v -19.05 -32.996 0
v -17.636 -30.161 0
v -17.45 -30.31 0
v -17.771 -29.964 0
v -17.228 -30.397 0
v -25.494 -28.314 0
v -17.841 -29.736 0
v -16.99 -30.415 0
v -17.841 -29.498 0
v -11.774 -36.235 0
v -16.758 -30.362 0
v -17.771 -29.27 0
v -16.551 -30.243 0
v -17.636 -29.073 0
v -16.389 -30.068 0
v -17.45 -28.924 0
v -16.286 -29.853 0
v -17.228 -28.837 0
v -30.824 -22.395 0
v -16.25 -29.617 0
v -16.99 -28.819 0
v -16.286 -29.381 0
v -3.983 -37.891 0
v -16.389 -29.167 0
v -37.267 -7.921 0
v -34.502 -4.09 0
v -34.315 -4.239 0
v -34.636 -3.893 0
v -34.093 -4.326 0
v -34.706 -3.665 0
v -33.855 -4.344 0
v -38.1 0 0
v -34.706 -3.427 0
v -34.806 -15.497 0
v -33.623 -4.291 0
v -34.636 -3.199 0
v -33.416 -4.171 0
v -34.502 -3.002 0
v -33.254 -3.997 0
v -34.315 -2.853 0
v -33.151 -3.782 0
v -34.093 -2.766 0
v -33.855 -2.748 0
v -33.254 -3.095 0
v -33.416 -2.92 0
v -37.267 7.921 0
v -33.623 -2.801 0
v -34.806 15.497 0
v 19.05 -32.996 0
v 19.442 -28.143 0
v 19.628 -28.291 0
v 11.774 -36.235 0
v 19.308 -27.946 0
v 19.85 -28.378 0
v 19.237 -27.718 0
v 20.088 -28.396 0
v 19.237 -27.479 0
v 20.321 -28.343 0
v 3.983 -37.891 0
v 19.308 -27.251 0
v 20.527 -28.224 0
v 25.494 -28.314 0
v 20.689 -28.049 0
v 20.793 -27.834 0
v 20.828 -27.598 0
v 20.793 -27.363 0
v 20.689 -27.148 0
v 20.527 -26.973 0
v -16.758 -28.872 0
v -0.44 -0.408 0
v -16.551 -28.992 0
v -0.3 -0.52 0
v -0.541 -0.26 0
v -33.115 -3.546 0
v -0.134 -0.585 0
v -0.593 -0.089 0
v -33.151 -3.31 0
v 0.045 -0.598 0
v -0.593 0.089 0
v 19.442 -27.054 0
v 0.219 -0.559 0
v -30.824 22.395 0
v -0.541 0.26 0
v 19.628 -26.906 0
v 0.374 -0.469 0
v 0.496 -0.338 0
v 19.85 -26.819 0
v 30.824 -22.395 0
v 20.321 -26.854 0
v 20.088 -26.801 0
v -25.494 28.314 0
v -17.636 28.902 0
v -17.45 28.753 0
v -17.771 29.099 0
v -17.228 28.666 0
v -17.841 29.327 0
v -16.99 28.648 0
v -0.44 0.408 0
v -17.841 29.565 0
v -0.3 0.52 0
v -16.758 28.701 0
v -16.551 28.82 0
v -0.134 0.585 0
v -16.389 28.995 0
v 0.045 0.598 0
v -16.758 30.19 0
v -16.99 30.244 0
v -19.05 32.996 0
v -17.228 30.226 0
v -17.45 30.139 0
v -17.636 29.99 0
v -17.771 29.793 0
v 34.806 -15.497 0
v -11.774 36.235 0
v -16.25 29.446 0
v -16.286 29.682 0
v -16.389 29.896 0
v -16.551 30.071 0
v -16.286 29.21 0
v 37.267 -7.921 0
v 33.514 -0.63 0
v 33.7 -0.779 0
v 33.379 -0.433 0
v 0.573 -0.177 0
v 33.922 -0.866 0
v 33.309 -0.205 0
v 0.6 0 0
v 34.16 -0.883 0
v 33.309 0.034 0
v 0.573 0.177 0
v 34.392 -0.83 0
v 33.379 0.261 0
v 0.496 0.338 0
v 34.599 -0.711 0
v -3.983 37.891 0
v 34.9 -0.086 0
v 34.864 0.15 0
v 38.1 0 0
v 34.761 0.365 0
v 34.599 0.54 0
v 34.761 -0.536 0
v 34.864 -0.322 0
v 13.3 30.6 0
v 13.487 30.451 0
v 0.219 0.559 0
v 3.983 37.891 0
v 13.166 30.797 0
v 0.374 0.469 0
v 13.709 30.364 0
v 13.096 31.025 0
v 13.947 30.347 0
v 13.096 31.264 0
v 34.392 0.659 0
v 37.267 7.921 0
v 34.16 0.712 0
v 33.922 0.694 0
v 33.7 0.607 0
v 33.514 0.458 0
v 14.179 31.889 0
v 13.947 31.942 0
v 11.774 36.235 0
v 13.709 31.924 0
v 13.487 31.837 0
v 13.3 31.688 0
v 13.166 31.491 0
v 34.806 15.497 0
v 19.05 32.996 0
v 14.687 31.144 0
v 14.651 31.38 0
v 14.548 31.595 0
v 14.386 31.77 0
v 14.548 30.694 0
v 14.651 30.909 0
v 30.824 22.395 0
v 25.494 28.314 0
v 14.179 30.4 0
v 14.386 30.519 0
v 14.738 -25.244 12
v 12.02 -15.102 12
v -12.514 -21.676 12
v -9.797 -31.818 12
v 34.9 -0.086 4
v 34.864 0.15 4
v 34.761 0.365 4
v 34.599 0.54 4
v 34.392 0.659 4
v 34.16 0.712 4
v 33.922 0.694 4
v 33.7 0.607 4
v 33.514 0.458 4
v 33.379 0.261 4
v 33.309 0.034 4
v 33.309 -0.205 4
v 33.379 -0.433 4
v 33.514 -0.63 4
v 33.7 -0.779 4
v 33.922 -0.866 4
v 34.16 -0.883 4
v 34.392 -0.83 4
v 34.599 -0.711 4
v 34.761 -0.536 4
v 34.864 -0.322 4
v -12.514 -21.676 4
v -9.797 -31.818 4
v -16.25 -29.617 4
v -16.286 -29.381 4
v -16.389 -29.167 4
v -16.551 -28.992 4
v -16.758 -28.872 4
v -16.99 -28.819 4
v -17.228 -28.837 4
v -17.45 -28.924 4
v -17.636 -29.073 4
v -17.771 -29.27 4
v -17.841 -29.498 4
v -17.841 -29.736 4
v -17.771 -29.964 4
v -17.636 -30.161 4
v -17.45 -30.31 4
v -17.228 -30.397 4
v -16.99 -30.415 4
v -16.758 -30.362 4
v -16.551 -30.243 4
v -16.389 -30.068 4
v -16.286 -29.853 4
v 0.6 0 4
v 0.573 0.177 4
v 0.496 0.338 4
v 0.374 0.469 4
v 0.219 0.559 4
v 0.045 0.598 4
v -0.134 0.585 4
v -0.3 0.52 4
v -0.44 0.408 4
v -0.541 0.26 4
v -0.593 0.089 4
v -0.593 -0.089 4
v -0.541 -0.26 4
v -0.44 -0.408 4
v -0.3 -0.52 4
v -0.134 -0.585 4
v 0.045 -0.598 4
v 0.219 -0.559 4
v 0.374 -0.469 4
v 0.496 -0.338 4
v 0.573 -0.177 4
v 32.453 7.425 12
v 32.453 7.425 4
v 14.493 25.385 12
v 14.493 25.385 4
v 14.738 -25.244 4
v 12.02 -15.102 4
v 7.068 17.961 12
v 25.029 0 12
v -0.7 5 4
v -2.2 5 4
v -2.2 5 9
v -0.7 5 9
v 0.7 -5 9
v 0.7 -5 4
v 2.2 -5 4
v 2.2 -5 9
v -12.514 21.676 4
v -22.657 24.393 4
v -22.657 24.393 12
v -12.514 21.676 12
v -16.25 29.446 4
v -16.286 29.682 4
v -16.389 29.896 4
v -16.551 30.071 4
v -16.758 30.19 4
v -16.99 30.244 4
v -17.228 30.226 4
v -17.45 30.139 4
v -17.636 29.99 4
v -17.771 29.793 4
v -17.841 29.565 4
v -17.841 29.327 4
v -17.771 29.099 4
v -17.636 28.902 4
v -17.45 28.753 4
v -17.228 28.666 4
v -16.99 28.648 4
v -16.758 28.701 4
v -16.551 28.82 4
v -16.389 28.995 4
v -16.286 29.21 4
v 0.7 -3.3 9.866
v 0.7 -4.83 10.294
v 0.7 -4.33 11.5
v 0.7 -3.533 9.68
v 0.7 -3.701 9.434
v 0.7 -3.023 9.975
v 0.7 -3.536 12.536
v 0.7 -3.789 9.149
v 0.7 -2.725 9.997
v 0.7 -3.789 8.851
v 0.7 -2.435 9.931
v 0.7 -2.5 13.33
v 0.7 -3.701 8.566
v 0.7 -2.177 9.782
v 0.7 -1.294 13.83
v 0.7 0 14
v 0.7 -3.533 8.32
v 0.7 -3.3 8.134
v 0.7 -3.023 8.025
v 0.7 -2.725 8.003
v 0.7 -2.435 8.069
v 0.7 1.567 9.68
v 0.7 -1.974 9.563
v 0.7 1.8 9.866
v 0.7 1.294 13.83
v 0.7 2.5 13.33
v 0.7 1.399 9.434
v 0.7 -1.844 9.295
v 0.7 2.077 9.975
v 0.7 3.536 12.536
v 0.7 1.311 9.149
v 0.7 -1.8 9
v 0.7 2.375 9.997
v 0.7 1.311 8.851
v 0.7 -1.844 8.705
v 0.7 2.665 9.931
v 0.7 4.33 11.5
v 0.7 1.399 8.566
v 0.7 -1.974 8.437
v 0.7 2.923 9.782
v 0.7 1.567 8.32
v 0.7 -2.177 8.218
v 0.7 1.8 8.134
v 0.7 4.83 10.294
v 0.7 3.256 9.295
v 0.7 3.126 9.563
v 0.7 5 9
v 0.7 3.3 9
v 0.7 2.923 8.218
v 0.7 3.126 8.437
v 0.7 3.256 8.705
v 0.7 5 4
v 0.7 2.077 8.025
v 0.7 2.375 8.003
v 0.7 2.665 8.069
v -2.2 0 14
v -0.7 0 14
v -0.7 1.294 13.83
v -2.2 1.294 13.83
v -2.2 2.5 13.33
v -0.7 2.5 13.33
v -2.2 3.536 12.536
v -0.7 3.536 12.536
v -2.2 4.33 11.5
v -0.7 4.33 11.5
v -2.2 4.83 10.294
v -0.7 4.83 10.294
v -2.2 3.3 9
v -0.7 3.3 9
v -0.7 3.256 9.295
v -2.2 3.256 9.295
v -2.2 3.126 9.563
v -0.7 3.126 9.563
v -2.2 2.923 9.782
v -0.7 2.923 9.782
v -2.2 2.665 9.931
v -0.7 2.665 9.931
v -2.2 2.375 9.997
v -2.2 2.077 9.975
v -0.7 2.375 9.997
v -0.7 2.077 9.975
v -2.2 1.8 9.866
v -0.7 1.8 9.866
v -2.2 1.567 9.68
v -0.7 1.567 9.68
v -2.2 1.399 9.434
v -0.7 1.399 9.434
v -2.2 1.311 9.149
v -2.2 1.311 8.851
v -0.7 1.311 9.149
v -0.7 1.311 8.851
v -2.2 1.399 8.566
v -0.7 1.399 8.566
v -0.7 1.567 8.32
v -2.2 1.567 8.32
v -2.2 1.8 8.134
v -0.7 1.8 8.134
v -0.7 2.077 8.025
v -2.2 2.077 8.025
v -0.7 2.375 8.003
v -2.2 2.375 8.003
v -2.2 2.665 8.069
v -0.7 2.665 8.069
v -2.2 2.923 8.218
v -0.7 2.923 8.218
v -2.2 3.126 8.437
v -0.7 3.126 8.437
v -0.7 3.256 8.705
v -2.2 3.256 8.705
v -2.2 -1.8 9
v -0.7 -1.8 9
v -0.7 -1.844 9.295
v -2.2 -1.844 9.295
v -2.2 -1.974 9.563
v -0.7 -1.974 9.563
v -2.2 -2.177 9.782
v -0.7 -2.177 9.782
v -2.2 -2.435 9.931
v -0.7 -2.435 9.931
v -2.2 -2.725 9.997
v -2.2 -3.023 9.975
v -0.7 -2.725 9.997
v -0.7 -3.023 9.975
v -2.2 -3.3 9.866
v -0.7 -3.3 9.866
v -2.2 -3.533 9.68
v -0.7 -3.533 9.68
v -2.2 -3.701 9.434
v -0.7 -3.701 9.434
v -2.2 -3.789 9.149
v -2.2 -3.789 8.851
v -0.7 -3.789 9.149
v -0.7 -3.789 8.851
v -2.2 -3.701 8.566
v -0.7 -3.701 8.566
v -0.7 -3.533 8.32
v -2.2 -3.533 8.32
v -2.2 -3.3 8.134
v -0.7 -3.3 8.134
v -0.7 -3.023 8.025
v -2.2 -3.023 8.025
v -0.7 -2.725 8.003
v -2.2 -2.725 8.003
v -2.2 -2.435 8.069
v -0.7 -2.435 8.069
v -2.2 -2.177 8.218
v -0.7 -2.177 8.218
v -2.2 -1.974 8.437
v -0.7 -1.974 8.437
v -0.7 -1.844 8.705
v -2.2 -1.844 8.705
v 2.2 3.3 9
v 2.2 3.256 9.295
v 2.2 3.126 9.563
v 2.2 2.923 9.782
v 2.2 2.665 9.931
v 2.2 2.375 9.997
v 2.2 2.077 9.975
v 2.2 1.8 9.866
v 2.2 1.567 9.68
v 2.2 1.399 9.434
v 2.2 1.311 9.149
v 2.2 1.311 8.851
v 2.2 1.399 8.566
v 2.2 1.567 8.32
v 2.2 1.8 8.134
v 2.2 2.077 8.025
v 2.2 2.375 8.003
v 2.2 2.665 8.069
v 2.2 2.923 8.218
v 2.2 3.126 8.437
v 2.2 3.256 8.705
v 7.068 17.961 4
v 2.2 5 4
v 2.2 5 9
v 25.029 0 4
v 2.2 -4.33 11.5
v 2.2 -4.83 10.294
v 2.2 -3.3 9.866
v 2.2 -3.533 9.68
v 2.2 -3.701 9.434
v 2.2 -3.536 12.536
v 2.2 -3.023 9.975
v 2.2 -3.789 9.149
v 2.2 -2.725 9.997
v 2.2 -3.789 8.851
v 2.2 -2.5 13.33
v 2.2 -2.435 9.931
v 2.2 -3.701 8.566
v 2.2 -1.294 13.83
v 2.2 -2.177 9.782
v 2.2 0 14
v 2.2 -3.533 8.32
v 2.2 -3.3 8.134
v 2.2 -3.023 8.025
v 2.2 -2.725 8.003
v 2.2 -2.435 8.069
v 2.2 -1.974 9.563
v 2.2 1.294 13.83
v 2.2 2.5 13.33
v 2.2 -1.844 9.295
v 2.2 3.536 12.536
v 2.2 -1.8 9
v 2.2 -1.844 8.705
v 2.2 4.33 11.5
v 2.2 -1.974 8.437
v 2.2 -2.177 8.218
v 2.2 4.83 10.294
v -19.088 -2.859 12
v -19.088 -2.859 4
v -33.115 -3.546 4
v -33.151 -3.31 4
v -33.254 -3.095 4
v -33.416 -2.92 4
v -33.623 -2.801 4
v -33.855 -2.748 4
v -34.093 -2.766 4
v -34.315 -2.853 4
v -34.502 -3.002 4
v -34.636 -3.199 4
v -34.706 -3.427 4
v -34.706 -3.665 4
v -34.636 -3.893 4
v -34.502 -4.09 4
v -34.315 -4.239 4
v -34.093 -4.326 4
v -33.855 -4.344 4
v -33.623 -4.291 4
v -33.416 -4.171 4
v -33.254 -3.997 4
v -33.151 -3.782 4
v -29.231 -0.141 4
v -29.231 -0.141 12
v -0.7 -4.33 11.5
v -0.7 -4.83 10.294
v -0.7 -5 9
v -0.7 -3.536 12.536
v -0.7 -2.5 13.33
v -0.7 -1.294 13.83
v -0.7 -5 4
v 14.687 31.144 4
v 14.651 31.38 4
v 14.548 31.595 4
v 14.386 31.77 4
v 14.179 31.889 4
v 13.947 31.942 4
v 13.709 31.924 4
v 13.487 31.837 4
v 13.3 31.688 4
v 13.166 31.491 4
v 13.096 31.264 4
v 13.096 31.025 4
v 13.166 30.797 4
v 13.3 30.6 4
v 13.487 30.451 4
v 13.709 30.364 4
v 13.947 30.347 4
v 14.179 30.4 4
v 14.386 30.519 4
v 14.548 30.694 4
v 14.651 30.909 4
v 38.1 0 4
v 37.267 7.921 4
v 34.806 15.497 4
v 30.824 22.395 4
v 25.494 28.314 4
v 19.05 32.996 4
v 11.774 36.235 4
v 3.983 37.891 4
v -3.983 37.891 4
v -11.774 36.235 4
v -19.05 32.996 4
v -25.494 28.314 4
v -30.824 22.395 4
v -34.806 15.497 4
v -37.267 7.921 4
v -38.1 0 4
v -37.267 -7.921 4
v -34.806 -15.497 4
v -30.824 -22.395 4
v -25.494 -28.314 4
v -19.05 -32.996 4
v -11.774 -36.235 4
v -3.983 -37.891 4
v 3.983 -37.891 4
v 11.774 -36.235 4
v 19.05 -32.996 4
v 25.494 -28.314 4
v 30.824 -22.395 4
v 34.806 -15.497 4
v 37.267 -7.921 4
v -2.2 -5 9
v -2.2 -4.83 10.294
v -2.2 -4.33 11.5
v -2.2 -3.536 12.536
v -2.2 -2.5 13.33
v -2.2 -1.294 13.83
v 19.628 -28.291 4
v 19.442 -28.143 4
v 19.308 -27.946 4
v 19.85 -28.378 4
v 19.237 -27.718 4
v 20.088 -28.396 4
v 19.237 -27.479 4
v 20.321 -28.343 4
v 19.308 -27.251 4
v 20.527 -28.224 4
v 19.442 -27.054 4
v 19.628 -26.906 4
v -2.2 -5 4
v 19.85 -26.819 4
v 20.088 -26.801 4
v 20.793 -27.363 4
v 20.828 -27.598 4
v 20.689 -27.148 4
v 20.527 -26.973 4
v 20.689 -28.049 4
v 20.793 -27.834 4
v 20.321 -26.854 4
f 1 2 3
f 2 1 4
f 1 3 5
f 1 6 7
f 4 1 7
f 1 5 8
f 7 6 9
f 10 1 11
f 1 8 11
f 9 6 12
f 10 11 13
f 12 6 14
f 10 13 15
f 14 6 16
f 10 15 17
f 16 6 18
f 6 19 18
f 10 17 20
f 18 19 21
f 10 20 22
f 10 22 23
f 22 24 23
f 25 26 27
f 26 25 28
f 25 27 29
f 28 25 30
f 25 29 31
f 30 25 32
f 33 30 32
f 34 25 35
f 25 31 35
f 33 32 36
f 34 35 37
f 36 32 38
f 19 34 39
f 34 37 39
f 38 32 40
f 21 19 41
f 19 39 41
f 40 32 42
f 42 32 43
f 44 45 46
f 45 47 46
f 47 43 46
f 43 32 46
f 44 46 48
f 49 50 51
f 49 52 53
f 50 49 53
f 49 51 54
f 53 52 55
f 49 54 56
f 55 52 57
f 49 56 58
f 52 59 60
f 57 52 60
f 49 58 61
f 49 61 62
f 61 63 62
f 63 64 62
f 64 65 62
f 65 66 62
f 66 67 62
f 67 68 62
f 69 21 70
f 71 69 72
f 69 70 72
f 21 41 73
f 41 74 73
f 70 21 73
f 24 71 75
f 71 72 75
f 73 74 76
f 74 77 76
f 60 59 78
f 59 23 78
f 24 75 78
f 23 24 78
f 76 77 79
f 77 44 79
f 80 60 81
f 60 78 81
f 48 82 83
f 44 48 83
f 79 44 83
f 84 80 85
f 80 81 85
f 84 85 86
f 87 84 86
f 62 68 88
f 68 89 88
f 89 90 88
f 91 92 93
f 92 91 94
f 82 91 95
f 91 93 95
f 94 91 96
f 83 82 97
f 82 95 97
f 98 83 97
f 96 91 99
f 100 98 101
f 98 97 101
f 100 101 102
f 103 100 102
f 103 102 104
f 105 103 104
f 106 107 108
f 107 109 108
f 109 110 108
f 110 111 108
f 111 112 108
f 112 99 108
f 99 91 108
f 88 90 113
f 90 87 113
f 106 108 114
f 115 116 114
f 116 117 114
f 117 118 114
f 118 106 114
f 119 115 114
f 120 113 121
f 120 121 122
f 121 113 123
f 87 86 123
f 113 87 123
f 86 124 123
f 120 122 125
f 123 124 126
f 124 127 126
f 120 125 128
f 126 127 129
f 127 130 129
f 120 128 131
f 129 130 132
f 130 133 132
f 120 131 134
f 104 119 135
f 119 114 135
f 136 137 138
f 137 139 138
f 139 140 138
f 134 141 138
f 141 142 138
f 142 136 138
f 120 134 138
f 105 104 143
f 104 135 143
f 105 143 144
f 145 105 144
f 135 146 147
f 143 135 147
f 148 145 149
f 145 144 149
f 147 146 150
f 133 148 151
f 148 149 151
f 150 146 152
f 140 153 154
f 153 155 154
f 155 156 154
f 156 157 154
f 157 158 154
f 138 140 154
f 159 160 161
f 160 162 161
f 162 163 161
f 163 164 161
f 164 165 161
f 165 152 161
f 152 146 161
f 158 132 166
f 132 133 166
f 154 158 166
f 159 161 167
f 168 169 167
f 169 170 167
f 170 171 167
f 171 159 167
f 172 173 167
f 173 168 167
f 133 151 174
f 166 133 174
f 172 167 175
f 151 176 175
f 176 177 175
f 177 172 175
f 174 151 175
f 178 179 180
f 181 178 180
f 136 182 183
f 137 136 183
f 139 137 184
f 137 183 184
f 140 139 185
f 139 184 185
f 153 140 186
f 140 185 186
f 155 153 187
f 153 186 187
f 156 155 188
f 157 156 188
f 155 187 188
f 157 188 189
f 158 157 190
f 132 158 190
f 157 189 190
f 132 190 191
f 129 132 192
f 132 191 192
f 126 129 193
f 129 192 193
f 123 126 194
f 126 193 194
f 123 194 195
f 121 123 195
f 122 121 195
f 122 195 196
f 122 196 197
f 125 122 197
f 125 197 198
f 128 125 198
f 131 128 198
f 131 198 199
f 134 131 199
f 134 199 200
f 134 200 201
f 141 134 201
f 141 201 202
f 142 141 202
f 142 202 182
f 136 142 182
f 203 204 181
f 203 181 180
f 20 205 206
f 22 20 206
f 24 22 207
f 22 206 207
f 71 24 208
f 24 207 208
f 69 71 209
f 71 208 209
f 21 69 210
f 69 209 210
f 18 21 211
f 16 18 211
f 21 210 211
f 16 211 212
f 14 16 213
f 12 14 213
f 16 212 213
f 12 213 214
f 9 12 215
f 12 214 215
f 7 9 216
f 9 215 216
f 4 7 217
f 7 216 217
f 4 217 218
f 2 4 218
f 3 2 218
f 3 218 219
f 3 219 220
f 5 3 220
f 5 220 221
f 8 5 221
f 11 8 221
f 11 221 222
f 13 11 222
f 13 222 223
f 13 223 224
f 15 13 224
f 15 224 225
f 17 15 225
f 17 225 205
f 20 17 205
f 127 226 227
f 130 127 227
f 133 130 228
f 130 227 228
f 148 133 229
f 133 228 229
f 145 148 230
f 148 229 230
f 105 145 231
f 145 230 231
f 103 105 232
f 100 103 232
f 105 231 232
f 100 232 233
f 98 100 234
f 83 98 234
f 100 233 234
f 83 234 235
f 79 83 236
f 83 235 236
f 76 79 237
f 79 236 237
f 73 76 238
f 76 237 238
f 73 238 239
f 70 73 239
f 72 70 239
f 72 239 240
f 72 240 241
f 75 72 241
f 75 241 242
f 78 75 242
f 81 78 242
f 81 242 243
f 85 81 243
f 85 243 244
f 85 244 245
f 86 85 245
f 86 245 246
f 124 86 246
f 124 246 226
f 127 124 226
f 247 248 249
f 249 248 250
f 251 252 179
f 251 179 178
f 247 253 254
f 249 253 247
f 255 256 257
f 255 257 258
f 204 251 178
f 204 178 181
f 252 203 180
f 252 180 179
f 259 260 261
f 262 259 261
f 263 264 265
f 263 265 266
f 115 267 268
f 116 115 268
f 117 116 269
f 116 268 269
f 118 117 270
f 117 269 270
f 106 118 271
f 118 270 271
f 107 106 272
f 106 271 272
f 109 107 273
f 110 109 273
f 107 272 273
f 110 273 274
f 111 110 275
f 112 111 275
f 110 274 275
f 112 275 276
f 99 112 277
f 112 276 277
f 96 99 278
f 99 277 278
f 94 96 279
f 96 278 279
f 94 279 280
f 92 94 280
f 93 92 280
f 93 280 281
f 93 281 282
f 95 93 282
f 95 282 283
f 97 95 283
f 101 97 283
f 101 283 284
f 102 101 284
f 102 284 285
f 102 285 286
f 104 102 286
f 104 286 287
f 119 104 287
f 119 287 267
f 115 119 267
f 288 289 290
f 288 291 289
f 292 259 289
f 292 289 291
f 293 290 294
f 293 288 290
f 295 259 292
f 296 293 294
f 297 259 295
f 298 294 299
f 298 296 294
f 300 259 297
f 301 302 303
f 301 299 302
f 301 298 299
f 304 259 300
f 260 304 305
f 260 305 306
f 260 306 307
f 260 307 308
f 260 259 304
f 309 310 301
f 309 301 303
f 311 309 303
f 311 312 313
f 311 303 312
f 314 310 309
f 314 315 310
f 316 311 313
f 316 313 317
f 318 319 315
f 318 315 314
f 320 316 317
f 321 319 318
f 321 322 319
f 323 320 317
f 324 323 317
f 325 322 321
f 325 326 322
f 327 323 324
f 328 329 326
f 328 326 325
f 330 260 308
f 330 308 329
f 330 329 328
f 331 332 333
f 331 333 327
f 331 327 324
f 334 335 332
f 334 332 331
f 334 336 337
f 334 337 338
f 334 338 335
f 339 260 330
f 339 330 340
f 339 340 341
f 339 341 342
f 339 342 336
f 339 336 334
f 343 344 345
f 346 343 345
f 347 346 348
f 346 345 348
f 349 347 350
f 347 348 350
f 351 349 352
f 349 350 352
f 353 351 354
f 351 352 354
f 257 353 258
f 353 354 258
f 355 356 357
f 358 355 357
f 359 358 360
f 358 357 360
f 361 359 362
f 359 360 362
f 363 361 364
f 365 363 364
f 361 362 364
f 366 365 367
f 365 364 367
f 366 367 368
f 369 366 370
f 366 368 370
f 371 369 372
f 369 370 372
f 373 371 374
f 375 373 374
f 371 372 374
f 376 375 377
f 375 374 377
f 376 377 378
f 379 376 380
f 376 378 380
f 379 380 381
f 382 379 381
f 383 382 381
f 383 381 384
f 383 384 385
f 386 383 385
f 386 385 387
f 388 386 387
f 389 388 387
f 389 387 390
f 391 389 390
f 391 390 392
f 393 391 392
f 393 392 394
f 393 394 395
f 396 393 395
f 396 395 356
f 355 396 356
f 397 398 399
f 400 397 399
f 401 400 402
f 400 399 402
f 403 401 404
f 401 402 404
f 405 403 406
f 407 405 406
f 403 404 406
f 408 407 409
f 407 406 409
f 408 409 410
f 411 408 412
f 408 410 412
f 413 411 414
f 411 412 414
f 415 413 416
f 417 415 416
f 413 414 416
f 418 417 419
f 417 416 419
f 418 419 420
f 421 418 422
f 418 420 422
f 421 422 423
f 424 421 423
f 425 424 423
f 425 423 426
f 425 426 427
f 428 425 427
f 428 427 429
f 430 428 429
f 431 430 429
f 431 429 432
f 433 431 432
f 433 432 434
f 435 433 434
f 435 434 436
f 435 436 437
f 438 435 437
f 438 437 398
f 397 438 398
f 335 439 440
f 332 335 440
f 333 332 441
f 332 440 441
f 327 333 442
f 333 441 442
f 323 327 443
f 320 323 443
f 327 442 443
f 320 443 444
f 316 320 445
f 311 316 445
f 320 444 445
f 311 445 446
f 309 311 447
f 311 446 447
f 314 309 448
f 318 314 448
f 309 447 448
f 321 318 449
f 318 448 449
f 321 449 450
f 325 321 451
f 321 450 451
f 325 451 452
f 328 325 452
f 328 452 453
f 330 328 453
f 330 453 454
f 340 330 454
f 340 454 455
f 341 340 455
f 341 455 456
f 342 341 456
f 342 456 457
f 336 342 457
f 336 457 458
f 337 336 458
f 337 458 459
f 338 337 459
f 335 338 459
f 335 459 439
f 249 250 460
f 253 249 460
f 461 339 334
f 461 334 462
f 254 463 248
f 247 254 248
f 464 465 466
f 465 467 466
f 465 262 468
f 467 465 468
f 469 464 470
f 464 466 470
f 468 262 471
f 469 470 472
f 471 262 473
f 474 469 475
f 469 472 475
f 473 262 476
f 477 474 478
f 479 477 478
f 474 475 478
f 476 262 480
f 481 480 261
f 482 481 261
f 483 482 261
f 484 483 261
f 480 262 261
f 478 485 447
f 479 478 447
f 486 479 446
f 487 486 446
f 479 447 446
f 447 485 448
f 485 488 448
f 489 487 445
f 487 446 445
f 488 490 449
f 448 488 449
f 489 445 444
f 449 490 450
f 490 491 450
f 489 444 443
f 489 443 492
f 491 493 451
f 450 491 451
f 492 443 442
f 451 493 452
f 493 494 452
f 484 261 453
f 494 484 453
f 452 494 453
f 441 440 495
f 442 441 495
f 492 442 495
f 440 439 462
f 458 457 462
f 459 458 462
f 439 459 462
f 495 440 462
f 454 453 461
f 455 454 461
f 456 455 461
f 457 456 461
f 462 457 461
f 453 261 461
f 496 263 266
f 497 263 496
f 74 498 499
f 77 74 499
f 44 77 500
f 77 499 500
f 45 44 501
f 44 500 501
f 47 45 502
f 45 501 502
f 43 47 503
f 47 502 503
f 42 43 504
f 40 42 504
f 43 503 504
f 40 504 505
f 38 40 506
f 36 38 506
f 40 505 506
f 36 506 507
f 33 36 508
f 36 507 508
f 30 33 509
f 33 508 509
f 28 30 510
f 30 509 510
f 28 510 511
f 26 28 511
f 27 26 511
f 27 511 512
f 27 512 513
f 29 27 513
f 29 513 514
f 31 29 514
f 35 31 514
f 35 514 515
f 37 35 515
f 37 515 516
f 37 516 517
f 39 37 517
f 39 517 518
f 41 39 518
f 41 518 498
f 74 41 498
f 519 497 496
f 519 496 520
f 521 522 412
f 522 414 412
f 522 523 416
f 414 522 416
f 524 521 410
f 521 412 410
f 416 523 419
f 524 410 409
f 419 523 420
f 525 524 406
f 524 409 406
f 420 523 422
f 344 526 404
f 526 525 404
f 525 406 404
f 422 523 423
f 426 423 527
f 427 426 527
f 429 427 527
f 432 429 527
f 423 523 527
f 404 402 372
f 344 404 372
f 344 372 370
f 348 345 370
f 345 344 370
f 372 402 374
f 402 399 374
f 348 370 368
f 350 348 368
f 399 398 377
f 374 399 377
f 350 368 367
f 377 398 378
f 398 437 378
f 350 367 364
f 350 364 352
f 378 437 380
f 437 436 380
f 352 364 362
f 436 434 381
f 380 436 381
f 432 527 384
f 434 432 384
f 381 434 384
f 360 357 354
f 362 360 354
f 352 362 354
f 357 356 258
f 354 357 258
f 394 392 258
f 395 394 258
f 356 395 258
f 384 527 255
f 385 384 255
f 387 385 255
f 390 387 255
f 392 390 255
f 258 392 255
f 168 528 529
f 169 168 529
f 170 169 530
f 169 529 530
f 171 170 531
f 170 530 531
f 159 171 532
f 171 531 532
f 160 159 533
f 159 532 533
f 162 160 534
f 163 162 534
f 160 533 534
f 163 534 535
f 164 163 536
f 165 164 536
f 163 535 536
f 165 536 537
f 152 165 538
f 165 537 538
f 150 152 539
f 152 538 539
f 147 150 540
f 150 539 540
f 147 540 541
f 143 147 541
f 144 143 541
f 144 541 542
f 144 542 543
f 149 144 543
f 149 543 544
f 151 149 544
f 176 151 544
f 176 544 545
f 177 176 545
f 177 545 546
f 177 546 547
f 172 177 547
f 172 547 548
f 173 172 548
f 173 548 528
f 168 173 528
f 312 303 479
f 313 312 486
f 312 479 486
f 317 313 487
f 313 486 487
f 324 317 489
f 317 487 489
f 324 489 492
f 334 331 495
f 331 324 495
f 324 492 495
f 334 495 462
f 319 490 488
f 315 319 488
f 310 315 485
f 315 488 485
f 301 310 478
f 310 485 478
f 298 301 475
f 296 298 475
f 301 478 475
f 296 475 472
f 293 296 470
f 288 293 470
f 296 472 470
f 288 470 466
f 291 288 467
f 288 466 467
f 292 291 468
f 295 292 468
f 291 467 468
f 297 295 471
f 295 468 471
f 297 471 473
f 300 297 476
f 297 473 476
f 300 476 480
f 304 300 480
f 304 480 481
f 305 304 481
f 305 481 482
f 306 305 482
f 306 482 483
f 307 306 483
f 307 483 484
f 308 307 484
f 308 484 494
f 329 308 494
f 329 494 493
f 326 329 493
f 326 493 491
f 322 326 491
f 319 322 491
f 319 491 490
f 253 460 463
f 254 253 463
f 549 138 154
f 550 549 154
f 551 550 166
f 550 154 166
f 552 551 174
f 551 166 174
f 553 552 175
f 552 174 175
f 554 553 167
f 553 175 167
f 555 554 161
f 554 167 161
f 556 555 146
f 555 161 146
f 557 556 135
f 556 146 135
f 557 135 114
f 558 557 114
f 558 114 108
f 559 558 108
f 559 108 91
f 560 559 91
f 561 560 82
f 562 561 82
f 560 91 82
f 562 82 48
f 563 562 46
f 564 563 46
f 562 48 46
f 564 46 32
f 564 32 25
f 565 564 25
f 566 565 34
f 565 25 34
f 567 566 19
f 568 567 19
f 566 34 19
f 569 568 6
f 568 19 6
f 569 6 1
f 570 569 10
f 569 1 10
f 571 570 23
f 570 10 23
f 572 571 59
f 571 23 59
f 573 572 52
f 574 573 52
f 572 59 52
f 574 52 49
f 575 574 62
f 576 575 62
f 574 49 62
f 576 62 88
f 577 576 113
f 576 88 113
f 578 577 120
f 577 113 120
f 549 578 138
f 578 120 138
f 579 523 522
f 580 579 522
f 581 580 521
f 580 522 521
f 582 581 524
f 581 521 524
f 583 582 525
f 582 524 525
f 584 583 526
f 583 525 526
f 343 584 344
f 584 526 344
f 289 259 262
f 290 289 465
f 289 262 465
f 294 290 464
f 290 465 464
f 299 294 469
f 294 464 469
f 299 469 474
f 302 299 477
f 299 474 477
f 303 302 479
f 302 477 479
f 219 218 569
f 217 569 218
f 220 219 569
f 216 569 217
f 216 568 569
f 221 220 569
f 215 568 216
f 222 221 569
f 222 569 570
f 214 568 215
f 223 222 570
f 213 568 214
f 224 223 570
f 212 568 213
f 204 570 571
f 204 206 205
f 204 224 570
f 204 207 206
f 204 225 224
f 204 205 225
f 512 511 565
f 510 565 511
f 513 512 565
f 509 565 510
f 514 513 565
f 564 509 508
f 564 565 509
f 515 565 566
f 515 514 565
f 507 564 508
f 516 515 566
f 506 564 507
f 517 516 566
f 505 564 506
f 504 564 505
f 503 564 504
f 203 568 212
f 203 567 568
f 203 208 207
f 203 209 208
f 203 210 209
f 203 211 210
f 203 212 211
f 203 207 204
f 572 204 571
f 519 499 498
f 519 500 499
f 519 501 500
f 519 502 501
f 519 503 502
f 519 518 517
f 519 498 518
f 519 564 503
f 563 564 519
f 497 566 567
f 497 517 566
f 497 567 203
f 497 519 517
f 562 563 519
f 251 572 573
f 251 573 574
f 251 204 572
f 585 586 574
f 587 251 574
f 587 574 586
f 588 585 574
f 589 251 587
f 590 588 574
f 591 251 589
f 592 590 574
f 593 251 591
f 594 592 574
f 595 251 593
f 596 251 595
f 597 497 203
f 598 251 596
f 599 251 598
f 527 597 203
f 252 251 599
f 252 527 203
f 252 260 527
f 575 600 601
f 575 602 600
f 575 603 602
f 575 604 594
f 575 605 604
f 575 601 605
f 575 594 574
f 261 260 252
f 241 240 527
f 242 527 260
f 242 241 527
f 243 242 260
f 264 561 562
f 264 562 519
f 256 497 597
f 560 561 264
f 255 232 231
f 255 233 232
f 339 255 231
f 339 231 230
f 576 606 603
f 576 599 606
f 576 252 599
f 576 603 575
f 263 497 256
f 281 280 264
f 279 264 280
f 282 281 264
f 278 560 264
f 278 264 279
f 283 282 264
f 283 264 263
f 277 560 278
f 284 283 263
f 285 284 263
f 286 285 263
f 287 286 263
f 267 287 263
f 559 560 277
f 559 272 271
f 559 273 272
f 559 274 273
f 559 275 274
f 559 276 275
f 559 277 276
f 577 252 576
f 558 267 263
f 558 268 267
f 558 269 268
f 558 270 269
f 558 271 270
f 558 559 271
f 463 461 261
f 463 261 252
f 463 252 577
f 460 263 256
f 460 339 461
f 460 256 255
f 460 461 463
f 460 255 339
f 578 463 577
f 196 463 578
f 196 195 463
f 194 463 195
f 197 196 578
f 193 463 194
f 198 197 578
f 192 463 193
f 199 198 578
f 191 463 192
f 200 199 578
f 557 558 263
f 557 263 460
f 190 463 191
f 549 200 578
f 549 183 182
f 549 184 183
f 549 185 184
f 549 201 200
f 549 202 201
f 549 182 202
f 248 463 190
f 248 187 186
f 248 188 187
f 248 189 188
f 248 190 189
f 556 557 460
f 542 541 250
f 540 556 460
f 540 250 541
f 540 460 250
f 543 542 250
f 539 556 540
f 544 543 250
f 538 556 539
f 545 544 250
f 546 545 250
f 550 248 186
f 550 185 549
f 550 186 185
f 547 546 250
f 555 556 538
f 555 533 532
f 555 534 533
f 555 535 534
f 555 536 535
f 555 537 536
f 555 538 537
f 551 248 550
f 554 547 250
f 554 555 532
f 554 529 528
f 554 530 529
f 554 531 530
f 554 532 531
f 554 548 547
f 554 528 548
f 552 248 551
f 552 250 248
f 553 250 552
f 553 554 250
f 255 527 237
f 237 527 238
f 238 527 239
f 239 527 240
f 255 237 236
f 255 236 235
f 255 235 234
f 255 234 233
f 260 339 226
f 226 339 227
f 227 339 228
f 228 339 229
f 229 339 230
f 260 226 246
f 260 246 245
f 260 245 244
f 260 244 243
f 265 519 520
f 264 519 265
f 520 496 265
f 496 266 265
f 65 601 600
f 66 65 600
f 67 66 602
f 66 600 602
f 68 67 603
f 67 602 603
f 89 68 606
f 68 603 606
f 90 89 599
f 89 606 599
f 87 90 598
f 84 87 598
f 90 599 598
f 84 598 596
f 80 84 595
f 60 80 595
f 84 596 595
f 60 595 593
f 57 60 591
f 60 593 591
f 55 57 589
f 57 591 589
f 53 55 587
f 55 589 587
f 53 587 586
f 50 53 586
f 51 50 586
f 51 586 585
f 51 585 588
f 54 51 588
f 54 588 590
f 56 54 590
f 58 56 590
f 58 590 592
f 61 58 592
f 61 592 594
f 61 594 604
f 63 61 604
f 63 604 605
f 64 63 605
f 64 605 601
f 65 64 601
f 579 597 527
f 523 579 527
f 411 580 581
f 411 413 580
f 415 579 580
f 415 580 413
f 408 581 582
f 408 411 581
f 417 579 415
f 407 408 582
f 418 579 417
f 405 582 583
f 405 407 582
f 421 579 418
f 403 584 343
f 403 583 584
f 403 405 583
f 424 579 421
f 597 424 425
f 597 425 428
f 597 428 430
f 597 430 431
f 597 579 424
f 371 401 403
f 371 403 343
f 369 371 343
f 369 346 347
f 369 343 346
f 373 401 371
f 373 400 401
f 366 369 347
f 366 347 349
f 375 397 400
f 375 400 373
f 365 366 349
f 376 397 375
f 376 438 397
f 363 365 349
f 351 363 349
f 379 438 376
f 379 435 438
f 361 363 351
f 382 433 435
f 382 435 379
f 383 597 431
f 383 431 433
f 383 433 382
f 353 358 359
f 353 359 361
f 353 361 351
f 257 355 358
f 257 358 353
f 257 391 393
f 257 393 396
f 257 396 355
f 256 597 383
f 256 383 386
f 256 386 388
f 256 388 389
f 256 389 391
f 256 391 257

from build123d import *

# Parameters (mm, degrees)
SKETCH2_R           = 38.1
BOSS_EXTRUDE1_DEPTH = 4
SKETCH3_R           = 0.8
CUT_EXTRUDE1_DEPTH  = 6
SKETCH4_R           = 0.6
CUT_EXTRUDE2_DEPTH  = 6
SKETCH5_W           = 1.5
SKETCH5_H           = 10
BOSS_EXTRUDE2_DEPTH = 10
CUT_EXTRUDE3_DEPTH  = 58.198776211
SKETCH7_R           = 1
CUT_EXTRUDE4_DEPTH  = 58.198776211
BOSS_EXTRUDE3_DEPTH = 8
SKETCH10_R          = 0.8
CUT_EXTRUDE5_DEPTH  = 55.801642311


with BuildPart() as part:
    # Sketch2 → Boss-Extrude1 (new body)
    with BuildSketch(Plane.XY):
        Circle(SKETCH2_R)
    extrude(amount=BOSS_EXTRUDE1_DEPTH)

    # Sketch3 → Cut-Extrude1 (cut)
    with BuildSketch(Plane.XY.offset(4)):
        with Locations((34.1, -0.085721815)):
            Circle(SKETCH3_R)
        with Locations((-17.05, -29.617188084)):
            Circle(SKETCH3_R)
        with Locations((-17.05, 29.445744454)):
            Circle(SKETCH3_R)
    extrude(amount=-CUT_EXTRUDE1_DEPTH, mode=Mode.SUBTRACT)

    # Sketch4 → Cut-Extrude2 (cut)
    with BuildSketch(Plane.XY.offset(4)):
        Circle(SKETCH4_R)
    extrude(amount=-CUT_EXTRUDE2_DEPTH, mode=Mode.SUBTRACT)

    # Sketch5 → Boss-Extrude2 (add)
    with BuildSketch(Plane.XY.offset(4)):
        with Locations((1.45, 0)):
            Rectangle(SKETCH5_W, SKETCH5_H)
        with Locations((-1.45, 0)):
            Rectangle(SKETCH5_W, SKETCH5_H)
    extrude(amount=BOSS_EXTRUDE2_DEPTH)

    # Sketch6 → Cut-Extrude3 (cut, through all)
    with BuildSketch(Plane(origin=(2.2, 0, 0), x_dir=(0, 0, -1), z_dir=(1, 0, 0))):
        with BuildLine():
            ThreePointArc((-14, 0), (-12.535533906, 3.535533906), (-9, 5))
            Line((-9, 5), (-14, 5))
            Line((-14, 5), (-14, 0))
        make_face()
        with BuildLine():
            ThreePointArc((-9, -5), (-12.535533906, -3.535533906), (-14, 0))
            Line((-14, 0), (-14, -5))
            Line((-14, -5), (-9, -5))
        make_face()
    extrude(amount=-CUT_EXTRUDE3_DEPTH, mode=Mode.SUBTRACT)

    # Sketch7 → Cut-Extrude4 (cut, through all)
    with BuildSketch(Plane(origin=(2.2, 0, 0), x_dir=(0, 0, -1), z_dir=(1, 0, 0))):
        with Locations(Location((-9, 2.3, 0), (0, 0, 90))):
            Circle(SKETCH7_R)
        with Locations(Location((-9, -2.8, 0), (0, 0, 90))):
            Circle(SKETCH7_R)
    extrude(amount=-CUT_EXTRUDE4_DEPTH, mode=Mode.SUBTRACT)

    # Sketch8 → Boss-Extrude3 (add)
    with BuildSketch(Plane.XY.offset(4)):
        Polygon((25.028792455, 0), (32.453413657, 7.424621202), (14.492901415, 25.385133445), (7.068280213, 17.960512242), align=None)
        Polygon((12.02011976, -15.101566346), (14.737719734, -25.243787522), (-9.796796254, -31.817791268), (-12.514396227, -21.675570092), align=None)
        Polygon((-19.088399973, -2.858945896), (-29.230621149, -0.141345922), (-22.656617403, 24.393170065), (-12.514396227, 21.675570092), align=None)
    extrude(amount=BOSS_EXTRUDE3_DEPTH)

    # Sketch10 → Cut-Extrude5 (cut, through all)
    with BuildSketch(Plane.XY.offset(4)):
        with Locations((13.886765868, 31.144304997)):
            Circle(SKETCH10_R)
        with Locations((20.028376376, -27.598444517)):
            Circle(SKETCH10_R)
        with Locations((-33.915142244, -3.54586048)):
            Circle(SKETCH10_R)
    extrude(amount=-CUT_EXTRUDE5_DEPTH, mode=Mode.SUBTRACT)


solid = part.part
